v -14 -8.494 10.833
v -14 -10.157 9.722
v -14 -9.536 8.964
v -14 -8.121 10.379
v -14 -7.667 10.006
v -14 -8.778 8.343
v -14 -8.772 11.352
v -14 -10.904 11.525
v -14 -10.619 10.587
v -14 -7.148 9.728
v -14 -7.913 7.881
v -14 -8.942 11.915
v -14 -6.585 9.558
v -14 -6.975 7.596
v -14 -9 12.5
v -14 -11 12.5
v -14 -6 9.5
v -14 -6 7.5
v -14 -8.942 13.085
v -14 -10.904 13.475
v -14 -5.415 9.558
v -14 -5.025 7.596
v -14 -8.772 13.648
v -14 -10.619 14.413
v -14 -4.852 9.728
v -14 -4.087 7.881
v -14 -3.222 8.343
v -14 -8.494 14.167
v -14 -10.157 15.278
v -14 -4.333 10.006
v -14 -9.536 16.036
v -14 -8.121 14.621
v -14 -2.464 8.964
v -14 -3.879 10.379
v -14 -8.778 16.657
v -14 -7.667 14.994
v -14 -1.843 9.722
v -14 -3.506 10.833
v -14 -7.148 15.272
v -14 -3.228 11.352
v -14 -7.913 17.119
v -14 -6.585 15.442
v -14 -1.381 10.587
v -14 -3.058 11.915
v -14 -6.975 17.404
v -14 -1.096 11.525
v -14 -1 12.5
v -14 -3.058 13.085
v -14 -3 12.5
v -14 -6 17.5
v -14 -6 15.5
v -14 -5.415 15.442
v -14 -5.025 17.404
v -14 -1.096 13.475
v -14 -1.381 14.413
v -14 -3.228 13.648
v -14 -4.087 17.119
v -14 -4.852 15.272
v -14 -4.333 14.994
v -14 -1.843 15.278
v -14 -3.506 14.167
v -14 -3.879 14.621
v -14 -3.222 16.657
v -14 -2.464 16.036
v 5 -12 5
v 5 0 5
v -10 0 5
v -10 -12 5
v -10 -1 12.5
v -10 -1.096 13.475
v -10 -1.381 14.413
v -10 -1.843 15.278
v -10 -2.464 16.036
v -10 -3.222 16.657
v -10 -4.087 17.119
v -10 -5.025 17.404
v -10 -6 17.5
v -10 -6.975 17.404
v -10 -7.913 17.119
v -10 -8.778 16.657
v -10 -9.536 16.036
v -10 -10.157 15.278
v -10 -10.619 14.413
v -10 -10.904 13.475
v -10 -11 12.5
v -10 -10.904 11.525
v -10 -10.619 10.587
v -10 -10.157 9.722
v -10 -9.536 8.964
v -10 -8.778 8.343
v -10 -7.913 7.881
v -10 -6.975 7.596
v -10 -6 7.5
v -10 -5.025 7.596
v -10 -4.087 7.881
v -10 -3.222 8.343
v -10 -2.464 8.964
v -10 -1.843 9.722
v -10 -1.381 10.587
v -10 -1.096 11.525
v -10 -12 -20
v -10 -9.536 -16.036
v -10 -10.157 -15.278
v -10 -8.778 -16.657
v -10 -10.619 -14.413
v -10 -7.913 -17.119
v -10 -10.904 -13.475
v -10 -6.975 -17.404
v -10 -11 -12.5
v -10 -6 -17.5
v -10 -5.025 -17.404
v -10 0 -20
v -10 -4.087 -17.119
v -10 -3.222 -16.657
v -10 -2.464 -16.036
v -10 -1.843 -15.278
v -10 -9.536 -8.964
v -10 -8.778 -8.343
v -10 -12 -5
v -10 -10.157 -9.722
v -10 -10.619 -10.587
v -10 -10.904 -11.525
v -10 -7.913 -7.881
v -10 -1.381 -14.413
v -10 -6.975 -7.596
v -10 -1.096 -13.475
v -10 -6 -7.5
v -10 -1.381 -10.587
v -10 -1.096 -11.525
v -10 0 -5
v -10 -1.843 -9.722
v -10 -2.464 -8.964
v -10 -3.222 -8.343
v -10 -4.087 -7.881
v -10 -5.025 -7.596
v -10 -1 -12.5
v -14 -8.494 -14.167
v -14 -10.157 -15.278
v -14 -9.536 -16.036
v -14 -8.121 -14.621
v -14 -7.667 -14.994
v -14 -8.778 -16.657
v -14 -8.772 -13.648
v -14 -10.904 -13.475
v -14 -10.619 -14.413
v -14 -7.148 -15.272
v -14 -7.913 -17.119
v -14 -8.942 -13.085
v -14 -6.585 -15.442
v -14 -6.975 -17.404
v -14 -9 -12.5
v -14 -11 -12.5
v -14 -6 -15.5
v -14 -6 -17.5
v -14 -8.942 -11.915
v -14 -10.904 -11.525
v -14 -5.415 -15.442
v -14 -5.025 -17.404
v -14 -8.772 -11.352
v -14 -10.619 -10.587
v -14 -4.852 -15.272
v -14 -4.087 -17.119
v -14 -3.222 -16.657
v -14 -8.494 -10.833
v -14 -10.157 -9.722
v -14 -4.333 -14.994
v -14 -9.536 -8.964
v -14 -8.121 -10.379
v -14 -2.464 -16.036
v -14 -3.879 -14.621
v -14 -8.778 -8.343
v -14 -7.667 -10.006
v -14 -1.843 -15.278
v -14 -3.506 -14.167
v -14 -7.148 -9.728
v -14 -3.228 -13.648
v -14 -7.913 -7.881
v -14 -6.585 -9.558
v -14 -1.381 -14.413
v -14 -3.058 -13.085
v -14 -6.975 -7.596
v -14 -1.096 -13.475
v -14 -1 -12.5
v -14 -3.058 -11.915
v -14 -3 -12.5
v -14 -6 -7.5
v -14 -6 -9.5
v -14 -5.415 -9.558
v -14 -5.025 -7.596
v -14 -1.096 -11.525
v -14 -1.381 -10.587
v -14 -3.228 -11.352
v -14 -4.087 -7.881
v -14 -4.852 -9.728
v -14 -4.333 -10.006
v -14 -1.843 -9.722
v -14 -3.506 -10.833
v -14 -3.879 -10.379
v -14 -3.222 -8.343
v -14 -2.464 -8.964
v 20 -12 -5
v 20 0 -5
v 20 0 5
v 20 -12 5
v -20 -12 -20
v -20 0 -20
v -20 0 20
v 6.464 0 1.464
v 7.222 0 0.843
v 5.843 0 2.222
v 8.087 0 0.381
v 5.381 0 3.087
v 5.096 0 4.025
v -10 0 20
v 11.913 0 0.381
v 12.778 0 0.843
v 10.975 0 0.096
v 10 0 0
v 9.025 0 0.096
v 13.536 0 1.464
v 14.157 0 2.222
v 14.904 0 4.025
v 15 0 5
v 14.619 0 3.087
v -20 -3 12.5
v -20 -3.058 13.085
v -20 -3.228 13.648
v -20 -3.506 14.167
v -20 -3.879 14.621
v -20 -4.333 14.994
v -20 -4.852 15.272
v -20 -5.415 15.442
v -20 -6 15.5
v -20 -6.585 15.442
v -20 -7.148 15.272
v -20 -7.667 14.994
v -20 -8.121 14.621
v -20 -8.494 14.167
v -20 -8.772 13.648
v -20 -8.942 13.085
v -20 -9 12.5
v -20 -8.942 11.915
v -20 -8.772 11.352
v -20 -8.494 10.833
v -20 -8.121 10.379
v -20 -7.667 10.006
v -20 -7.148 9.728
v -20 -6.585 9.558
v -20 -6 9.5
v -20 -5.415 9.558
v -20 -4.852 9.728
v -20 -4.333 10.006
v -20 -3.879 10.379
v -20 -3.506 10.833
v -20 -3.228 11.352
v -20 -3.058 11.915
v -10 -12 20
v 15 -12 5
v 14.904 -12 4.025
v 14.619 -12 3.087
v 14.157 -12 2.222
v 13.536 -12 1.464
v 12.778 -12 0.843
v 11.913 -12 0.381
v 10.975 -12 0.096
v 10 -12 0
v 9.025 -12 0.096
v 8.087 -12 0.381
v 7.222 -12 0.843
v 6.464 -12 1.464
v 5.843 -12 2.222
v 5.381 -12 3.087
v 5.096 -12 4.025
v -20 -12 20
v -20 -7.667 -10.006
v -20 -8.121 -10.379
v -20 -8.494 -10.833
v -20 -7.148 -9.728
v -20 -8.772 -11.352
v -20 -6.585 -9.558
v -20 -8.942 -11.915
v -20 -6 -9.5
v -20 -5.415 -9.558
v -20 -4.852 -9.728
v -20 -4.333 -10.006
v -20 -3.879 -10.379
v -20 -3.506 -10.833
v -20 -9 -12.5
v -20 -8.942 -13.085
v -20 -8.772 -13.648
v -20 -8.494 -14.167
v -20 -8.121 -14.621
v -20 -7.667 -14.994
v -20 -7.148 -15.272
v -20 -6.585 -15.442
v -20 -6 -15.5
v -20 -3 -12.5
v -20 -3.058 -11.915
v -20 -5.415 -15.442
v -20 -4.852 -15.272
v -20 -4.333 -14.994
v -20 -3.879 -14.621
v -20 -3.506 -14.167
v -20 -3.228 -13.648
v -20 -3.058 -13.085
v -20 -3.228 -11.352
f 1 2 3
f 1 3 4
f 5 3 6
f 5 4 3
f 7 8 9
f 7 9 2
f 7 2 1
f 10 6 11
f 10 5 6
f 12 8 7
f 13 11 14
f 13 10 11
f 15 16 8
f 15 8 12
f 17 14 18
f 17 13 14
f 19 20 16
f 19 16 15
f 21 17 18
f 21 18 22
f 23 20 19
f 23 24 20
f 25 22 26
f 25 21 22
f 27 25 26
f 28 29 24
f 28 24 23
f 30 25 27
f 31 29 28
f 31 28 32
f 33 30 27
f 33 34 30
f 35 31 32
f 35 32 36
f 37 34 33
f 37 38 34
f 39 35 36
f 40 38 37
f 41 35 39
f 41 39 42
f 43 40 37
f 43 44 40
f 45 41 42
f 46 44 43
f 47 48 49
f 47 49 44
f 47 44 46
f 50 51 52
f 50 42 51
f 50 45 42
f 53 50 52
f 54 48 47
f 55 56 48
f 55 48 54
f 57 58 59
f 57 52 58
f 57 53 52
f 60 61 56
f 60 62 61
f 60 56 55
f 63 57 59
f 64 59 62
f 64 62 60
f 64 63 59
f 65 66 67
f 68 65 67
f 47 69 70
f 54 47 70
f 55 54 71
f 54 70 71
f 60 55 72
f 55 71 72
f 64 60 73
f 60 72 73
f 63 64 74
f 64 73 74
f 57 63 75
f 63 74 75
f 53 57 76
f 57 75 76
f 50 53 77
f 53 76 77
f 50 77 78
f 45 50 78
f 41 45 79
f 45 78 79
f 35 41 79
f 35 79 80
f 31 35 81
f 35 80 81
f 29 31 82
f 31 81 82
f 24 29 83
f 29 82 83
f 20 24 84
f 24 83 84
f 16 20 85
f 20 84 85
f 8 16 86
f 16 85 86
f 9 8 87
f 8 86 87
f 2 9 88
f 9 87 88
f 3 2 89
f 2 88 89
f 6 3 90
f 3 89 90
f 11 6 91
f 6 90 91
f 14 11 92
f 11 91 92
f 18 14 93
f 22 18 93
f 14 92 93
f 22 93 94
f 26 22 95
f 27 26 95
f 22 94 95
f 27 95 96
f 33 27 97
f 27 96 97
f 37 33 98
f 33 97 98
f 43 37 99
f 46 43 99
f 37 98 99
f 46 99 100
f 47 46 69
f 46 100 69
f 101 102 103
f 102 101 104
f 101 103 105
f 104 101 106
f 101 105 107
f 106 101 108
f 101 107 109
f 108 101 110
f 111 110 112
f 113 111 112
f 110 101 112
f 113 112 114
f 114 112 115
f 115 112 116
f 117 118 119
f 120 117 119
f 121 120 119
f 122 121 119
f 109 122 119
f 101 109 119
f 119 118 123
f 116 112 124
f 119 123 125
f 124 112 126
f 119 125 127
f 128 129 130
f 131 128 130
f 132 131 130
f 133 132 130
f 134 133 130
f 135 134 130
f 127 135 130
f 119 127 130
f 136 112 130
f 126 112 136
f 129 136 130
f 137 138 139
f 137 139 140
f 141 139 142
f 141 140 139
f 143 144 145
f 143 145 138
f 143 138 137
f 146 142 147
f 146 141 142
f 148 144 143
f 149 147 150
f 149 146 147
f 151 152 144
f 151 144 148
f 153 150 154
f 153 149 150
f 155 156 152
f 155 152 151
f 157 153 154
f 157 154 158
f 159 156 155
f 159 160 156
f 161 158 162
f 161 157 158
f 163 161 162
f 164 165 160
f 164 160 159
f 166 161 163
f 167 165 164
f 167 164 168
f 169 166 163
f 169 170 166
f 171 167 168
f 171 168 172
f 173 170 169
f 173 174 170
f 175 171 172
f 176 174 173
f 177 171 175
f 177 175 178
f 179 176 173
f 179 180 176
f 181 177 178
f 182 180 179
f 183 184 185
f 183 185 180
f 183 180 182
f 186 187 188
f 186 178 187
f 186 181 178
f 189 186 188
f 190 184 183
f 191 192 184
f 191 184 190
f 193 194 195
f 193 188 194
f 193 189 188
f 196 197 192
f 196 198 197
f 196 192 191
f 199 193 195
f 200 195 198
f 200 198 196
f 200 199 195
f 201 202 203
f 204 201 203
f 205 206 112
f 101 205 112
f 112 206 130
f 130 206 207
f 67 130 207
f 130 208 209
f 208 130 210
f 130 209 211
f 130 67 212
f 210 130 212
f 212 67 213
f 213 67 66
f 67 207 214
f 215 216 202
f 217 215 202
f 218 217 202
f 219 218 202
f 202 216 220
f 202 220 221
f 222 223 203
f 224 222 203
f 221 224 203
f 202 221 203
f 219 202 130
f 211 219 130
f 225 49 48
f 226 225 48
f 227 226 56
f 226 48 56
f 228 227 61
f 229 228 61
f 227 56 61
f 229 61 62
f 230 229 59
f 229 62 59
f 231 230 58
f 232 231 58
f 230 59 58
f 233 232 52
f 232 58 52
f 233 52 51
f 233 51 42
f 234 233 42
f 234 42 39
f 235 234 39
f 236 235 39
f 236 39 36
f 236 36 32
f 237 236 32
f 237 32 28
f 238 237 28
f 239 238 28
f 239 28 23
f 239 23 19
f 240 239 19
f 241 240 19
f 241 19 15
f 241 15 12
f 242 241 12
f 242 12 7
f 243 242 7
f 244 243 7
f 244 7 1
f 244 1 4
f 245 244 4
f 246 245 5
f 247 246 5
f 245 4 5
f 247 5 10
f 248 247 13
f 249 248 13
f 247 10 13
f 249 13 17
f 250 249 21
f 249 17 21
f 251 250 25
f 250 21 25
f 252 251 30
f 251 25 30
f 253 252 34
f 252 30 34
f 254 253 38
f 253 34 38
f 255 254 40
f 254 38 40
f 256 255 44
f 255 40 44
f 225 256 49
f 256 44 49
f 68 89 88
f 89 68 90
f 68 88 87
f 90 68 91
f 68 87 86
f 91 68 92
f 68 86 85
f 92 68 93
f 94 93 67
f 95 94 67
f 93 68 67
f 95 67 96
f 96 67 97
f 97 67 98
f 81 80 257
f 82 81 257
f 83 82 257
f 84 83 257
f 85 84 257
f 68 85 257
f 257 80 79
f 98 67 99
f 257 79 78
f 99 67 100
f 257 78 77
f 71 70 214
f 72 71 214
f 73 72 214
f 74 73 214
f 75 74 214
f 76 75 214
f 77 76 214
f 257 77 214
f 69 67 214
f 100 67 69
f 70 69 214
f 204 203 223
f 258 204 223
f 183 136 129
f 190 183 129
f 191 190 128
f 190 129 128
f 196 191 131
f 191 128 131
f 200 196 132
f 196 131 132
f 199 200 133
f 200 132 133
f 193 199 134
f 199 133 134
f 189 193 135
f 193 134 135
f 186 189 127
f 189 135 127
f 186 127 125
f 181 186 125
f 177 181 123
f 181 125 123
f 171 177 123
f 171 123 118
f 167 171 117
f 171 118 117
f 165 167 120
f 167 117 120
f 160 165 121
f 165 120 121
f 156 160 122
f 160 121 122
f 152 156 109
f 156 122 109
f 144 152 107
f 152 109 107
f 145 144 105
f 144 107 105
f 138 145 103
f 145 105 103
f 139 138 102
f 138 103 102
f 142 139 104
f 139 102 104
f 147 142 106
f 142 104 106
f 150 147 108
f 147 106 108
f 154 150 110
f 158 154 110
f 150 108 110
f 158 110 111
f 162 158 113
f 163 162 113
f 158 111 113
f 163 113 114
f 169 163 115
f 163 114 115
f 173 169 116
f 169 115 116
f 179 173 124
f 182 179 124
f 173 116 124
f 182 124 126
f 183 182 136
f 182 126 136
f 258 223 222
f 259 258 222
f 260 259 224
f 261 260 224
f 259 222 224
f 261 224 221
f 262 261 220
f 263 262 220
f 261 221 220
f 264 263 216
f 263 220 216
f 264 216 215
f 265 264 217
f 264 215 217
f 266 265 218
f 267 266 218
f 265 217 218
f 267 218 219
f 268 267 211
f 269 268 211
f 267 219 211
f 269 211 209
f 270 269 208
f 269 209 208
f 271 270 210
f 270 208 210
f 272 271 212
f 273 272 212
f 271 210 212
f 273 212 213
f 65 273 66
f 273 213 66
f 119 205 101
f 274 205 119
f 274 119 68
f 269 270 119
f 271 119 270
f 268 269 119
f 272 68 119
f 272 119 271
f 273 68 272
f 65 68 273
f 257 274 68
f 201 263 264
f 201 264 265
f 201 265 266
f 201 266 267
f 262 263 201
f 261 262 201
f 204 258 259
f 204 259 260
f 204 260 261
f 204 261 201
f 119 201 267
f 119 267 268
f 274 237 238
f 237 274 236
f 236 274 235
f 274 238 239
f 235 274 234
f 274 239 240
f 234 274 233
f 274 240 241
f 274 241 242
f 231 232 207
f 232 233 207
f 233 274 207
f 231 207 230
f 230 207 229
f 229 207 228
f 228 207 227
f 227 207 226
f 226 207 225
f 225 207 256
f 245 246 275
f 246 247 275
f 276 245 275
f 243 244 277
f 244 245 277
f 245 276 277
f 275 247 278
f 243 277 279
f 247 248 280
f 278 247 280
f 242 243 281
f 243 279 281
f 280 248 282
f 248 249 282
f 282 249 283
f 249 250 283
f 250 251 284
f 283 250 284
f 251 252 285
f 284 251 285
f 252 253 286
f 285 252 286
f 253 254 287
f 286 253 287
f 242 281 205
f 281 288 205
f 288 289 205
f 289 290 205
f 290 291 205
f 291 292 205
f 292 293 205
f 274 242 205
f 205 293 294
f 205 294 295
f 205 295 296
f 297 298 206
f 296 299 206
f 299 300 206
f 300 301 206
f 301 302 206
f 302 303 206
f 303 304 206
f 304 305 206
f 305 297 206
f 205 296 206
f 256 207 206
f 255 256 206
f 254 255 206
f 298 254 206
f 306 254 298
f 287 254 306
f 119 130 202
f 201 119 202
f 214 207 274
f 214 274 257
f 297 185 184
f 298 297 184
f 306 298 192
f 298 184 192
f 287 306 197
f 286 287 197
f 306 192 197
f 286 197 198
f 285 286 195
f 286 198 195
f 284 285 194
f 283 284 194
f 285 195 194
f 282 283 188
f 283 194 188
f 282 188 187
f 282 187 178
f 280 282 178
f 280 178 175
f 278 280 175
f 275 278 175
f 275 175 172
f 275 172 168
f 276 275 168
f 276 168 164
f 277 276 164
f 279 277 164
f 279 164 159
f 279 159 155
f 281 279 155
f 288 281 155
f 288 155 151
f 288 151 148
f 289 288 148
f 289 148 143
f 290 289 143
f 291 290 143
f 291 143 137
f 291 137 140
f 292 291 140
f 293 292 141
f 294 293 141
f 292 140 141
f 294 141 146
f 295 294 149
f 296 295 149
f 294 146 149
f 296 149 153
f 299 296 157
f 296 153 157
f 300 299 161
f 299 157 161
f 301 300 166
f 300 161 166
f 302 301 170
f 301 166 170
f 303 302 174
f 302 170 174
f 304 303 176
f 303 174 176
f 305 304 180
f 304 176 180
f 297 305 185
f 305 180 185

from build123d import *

# Parameters (mm, degrees)
F0_W     = 10
F0_H     = 15
F0_H_2   = 10
F1_DEPTH = 12
F2_R     = 3
F3_DEPTH = 10.001
F4_R     = 5
F4_R_2   = 3
F5_DEPTH = 4
F6_R     = 5
F6_R_2   = 3
F7_DEPTH = 4


with BuildPart() as f1:
    # F0 (on Front) → F1 (new body)
    with BuildSketch(Plane.XZ):
        with Locations((-15, 12.5)):
            Rectangle(F0_W, F0_H)
        with Locations((-15, 0)):
            Rectangle(F0_W, F0_H_2)
        with Locations((-15, -12.5)):
            Rectangle(F0_W, F0_H)
        with BuildLine():
            Line((-10, -5), (20, -5))
            Line((20, -5), (20, 5))
            Line((20, 5), (15, 5))
            ThreePointArc((15, 5), (10, 0), (5, 5))
            Line((5, 5), (-10, 5))
            Line((-10, 5), (-10, -5))
        make_face()
    extrude(amount=F1_DEPTH)

    # F2 (on face) → F3 (cut, through all)
    with BuildSketch(Plane.YZ.offset(-10)):
        with Locations((-6, 12.5)):
            Circle(F2_R)
        with Locations((-6, -12.5)):
            Circle(F2_R)
    extrude(amount=-F3_DEPTH, mode=Mode.SUBTRACT)

    # F4 (on face) → F5 (cut)
    with BuildSketch(Plane.YZ.offset(-10)):
        with Locations((-6, 12.5)):
            Circle(F4_R)
        with Locations((-6, 12.5)):
            Circle(F4_R_2, mode=Mode.SUBTRACT)
    extrude(amount=-F5_DEPTH, mode=Mode.SUBTRACT)

    # F6 (on face) → F7 (cut)
    with BuildSketch(Plane.YZ.offset(-10)):
        with Locations((-6, -12.5)):
            Circle(F6_R)
        with Locations((-6, -12.5)):
            Circle(F6_R_2, mode=Mode.SUBTRACT)
    extrude(amount=-F7_DEPTH, mode=Mode.SUBTRACT)


solid = f1.part
